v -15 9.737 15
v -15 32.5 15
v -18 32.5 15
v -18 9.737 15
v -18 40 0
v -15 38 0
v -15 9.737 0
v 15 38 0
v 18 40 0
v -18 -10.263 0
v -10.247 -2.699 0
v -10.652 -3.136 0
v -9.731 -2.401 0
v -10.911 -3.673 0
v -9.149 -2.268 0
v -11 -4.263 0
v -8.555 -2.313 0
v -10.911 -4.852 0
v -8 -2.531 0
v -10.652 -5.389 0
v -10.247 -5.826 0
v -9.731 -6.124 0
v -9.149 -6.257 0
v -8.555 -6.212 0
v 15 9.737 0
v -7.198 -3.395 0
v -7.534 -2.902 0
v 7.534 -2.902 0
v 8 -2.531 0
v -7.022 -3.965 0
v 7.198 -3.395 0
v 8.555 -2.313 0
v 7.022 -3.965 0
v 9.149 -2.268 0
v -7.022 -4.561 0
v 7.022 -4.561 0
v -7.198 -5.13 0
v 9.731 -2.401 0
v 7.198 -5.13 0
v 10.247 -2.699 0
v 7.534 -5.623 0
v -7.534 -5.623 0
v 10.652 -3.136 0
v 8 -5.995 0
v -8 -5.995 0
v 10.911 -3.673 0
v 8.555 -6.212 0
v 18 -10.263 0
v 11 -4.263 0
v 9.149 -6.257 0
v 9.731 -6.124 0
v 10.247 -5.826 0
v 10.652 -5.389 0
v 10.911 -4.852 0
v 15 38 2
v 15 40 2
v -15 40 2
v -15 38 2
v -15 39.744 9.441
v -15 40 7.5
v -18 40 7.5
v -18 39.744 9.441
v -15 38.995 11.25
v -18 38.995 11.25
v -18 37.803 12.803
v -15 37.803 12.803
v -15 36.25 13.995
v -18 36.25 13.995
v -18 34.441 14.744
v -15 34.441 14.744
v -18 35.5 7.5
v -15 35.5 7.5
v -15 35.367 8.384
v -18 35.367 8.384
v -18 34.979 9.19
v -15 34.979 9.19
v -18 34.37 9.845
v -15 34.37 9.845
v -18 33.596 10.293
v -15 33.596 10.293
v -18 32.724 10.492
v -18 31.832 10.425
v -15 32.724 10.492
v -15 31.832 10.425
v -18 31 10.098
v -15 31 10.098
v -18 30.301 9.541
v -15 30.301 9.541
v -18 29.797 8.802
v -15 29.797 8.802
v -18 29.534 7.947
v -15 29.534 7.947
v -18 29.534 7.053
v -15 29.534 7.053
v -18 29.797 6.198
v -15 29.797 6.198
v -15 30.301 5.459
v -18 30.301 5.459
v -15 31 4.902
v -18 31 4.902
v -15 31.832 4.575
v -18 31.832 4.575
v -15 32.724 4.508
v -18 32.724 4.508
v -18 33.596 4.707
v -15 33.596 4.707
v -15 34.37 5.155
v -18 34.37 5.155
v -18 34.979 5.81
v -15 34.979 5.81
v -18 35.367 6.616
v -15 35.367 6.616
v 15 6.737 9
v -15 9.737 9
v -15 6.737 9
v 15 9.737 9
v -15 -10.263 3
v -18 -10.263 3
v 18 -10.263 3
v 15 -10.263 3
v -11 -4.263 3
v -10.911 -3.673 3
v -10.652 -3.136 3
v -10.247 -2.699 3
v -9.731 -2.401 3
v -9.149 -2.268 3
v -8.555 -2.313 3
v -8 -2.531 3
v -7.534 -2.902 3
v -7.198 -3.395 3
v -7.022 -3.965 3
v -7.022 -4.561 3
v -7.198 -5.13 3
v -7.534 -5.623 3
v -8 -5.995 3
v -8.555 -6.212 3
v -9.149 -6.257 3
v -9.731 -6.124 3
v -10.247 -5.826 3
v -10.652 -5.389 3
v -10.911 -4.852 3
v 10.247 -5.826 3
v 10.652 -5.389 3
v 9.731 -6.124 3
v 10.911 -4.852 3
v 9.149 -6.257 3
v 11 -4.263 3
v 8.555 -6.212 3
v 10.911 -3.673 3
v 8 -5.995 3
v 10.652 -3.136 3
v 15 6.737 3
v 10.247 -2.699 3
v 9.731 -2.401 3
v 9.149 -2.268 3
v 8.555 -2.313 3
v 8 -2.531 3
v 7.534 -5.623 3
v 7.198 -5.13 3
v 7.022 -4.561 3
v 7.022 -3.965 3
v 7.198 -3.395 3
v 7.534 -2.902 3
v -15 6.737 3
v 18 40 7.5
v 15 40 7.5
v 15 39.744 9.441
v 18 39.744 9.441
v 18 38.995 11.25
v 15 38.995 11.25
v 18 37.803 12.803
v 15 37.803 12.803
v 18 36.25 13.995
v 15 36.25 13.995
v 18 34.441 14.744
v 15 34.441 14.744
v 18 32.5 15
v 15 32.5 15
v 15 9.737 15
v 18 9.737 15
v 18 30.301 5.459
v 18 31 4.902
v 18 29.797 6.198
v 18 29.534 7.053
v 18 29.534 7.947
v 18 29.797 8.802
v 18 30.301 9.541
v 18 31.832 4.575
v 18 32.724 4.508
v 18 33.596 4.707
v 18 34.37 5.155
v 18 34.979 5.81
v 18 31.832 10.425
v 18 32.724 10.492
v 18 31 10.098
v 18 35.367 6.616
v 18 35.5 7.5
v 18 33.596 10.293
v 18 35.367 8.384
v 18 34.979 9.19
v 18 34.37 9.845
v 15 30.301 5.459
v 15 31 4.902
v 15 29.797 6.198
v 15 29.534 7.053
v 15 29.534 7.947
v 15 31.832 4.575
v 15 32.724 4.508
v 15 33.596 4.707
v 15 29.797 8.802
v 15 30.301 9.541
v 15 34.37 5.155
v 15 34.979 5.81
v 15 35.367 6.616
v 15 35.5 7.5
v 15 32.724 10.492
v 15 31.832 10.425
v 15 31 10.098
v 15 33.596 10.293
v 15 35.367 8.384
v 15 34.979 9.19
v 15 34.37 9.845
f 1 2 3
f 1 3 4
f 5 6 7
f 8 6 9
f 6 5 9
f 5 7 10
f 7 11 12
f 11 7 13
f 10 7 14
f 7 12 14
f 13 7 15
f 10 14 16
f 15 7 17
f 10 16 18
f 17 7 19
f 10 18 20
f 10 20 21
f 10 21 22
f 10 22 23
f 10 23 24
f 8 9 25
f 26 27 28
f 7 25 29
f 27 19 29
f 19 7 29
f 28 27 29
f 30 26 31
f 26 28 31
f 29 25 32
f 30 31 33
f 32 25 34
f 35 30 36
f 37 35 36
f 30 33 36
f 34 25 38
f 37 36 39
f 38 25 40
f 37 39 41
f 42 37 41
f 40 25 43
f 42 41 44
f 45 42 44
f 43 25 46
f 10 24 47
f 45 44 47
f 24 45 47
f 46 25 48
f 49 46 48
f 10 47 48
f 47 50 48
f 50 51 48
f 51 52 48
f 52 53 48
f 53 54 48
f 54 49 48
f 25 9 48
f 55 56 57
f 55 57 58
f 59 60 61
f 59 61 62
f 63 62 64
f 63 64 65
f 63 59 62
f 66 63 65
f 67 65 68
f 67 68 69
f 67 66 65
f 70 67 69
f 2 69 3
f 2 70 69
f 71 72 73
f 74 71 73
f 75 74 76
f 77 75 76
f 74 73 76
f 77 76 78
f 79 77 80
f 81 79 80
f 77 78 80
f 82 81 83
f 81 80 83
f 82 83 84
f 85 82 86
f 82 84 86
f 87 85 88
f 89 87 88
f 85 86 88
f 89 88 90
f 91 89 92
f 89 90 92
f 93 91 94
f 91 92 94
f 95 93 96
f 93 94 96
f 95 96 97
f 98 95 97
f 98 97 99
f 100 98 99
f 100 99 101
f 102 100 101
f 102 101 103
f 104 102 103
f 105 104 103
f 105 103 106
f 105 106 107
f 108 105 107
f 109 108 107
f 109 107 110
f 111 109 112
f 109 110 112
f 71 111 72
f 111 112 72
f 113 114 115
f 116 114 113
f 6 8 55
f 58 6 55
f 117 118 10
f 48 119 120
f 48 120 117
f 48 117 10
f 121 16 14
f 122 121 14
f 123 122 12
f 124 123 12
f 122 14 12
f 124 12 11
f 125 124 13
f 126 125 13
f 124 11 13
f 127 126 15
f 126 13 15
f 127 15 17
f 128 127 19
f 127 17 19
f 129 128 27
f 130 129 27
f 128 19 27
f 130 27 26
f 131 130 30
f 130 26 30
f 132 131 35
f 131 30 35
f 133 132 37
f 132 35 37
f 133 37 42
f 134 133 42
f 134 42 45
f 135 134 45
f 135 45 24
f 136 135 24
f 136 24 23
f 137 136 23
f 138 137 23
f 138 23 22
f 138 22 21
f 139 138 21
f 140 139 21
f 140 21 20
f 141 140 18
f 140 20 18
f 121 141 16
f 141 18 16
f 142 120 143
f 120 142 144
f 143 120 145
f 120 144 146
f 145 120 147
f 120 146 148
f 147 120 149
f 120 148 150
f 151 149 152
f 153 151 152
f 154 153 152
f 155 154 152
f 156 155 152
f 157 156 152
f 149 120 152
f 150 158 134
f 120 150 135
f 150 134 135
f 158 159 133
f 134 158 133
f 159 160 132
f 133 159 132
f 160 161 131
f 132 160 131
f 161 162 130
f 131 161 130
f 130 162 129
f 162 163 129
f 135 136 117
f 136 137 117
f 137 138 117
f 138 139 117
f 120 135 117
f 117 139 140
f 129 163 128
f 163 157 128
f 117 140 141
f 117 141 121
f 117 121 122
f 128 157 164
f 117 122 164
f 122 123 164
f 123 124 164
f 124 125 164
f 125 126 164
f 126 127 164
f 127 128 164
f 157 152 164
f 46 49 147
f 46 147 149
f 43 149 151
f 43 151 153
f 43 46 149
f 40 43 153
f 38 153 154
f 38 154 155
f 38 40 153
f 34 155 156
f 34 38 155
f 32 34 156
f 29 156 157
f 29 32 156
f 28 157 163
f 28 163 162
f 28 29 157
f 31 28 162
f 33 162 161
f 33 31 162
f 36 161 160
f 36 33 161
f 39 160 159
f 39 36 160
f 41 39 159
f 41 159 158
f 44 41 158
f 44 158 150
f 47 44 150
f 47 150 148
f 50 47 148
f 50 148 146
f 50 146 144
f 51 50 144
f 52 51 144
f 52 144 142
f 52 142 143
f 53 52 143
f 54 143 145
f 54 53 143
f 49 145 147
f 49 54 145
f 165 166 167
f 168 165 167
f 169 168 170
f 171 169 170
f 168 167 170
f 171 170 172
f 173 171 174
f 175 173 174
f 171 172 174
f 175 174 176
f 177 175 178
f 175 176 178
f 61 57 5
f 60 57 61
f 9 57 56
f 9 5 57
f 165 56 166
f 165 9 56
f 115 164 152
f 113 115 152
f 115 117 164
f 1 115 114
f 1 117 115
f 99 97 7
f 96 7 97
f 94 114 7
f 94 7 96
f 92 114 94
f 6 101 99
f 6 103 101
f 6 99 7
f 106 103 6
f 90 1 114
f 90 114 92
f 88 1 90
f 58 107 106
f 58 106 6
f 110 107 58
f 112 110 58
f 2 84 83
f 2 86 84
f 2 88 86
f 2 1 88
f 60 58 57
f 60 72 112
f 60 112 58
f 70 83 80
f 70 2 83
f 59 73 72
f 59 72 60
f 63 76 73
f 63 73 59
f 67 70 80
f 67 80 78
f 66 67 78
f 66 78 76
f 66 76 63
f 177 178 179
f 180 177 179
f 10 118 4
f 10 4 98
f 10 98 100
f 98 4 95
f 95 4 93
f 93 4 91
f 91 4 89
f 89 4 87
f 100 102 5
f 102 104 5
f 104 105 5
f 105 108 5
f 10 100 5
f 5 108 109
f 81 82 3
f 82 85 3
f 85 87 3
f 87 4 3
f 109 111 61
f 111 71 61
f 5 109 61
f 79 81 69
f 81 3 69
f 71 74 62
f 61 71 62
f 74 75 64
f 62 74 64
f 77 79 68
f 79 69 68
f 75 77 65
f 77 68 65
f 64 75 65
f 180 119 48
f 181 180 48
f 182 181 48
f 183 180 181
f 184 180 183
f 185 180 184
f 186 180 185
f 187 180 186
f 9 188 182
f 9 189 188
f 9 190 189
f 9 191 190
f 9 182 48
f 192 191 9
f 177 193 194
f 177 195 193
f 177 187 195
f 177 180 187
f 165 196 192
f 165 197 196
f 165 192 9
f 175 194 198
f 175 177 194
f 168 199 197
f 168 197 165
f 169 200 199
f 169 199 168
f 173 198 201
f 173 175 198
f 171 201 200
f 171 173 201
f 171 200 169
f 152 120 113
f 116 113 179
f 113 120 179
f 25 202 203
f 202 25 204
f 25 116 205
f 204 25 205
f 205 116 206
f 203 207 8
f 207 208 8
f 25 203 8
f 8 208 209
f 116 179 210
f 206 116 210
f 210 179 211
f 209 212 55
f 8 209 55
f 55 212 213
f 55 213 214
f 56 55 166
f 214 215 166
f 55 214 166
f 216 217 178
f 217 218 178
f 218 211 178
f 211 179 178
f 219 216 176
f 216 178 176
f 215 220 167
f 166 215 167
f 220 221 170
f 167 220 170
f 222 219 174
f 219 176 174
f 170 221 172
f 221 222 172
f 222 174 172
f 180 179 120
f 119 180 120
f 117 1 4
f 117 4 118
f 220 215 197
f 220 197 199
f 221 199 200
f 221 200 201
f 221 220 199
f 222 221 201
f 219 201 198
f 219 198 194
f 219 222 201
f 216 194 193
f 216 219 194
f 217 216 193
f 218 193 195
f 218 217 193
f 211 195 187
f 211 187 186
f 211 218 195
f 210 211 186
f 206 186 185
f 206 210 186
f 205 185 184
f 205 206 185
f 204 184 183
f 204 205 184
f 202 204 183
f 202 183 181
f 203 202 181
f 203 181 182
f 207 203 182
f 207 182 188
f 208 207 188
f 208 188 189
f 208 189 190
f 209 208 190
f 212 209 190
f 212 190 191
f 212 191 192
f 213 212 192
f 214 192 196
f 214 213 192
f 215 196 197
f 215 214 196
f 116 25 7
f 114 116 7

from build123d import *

# Parameters (mm, degrees)
F0_W     = 15
F0_H     = 20
F0_R     = 2
F1_DEPTH = 3
F2_R     = 3
F3_DEPTH = 3
F5_W     = 30
F5_H     = 3
F6_DEPTH = 6
F7_W     = 2
F7_H     = 2
F8_DEPTH = 30


with BuildPart() as f1:
    # F0 (on Top) → F1 (new body)
    with BuildSketch(Plane.XY):
        with Locations((7.5, -0.262594)):
            Rectangle(F0_W, F0_H)
        with Locations((9, -4.262594)):
            Circle(F0_R, mode=Mode.SUBTRACT)
    extrude(amount=F1_DEPTH)

    # F2 (on face) → F3 (join)
    with BuildSketch(Plane.YZ.offset(15)):
        Polygon((-10.262594, 0), (0, 0), (9.737406, 0), (9.737406, 15), (-10.262594, 3), align=None)
        with BuildLine():
            Line((9.737406, 15), (9.737406, 0))
            Line((9.737406, 0), (40, 0))
            Line((40, 0), (40, 7.5))
            ThreePointArc((40, 7.5), (37.803301, 12.803301), (32.5, 15))
            Line((32.5, 15), (9.737406, 15))
        make_face()
        with Locations((32.5, 7.5)):
            Circle(F2_R, mode=Mode.SUBTRACT)
    extrude(amount=F3_DEPTH)

    # F4: F1 across plane


with BuildPart() as f1_1:
    add(f1.part)
    add(f1.part.mirror(Plane.YZ))

    # F5 (on face) → F6 (join)
    with BuildSketch(Plane.XY.offset(3)):
        with Locations((0, 8.237406)):
            Rectangle(F5_W, F5_H)
    extrude(amount=F6_DEPTH)

    # F7 (on face) → F8 (join, through all)
    with BuildSketch(Plane(origin=(15, 0, 0), x_dir=(0, -1, 0), z_dir=(-1, 0, 0))):
        with Locations((-39, 1)):
            Rectangle(F7_W, F7_H)
    extrude(amount=F8_DEPTH)


solid = f1_1.part
